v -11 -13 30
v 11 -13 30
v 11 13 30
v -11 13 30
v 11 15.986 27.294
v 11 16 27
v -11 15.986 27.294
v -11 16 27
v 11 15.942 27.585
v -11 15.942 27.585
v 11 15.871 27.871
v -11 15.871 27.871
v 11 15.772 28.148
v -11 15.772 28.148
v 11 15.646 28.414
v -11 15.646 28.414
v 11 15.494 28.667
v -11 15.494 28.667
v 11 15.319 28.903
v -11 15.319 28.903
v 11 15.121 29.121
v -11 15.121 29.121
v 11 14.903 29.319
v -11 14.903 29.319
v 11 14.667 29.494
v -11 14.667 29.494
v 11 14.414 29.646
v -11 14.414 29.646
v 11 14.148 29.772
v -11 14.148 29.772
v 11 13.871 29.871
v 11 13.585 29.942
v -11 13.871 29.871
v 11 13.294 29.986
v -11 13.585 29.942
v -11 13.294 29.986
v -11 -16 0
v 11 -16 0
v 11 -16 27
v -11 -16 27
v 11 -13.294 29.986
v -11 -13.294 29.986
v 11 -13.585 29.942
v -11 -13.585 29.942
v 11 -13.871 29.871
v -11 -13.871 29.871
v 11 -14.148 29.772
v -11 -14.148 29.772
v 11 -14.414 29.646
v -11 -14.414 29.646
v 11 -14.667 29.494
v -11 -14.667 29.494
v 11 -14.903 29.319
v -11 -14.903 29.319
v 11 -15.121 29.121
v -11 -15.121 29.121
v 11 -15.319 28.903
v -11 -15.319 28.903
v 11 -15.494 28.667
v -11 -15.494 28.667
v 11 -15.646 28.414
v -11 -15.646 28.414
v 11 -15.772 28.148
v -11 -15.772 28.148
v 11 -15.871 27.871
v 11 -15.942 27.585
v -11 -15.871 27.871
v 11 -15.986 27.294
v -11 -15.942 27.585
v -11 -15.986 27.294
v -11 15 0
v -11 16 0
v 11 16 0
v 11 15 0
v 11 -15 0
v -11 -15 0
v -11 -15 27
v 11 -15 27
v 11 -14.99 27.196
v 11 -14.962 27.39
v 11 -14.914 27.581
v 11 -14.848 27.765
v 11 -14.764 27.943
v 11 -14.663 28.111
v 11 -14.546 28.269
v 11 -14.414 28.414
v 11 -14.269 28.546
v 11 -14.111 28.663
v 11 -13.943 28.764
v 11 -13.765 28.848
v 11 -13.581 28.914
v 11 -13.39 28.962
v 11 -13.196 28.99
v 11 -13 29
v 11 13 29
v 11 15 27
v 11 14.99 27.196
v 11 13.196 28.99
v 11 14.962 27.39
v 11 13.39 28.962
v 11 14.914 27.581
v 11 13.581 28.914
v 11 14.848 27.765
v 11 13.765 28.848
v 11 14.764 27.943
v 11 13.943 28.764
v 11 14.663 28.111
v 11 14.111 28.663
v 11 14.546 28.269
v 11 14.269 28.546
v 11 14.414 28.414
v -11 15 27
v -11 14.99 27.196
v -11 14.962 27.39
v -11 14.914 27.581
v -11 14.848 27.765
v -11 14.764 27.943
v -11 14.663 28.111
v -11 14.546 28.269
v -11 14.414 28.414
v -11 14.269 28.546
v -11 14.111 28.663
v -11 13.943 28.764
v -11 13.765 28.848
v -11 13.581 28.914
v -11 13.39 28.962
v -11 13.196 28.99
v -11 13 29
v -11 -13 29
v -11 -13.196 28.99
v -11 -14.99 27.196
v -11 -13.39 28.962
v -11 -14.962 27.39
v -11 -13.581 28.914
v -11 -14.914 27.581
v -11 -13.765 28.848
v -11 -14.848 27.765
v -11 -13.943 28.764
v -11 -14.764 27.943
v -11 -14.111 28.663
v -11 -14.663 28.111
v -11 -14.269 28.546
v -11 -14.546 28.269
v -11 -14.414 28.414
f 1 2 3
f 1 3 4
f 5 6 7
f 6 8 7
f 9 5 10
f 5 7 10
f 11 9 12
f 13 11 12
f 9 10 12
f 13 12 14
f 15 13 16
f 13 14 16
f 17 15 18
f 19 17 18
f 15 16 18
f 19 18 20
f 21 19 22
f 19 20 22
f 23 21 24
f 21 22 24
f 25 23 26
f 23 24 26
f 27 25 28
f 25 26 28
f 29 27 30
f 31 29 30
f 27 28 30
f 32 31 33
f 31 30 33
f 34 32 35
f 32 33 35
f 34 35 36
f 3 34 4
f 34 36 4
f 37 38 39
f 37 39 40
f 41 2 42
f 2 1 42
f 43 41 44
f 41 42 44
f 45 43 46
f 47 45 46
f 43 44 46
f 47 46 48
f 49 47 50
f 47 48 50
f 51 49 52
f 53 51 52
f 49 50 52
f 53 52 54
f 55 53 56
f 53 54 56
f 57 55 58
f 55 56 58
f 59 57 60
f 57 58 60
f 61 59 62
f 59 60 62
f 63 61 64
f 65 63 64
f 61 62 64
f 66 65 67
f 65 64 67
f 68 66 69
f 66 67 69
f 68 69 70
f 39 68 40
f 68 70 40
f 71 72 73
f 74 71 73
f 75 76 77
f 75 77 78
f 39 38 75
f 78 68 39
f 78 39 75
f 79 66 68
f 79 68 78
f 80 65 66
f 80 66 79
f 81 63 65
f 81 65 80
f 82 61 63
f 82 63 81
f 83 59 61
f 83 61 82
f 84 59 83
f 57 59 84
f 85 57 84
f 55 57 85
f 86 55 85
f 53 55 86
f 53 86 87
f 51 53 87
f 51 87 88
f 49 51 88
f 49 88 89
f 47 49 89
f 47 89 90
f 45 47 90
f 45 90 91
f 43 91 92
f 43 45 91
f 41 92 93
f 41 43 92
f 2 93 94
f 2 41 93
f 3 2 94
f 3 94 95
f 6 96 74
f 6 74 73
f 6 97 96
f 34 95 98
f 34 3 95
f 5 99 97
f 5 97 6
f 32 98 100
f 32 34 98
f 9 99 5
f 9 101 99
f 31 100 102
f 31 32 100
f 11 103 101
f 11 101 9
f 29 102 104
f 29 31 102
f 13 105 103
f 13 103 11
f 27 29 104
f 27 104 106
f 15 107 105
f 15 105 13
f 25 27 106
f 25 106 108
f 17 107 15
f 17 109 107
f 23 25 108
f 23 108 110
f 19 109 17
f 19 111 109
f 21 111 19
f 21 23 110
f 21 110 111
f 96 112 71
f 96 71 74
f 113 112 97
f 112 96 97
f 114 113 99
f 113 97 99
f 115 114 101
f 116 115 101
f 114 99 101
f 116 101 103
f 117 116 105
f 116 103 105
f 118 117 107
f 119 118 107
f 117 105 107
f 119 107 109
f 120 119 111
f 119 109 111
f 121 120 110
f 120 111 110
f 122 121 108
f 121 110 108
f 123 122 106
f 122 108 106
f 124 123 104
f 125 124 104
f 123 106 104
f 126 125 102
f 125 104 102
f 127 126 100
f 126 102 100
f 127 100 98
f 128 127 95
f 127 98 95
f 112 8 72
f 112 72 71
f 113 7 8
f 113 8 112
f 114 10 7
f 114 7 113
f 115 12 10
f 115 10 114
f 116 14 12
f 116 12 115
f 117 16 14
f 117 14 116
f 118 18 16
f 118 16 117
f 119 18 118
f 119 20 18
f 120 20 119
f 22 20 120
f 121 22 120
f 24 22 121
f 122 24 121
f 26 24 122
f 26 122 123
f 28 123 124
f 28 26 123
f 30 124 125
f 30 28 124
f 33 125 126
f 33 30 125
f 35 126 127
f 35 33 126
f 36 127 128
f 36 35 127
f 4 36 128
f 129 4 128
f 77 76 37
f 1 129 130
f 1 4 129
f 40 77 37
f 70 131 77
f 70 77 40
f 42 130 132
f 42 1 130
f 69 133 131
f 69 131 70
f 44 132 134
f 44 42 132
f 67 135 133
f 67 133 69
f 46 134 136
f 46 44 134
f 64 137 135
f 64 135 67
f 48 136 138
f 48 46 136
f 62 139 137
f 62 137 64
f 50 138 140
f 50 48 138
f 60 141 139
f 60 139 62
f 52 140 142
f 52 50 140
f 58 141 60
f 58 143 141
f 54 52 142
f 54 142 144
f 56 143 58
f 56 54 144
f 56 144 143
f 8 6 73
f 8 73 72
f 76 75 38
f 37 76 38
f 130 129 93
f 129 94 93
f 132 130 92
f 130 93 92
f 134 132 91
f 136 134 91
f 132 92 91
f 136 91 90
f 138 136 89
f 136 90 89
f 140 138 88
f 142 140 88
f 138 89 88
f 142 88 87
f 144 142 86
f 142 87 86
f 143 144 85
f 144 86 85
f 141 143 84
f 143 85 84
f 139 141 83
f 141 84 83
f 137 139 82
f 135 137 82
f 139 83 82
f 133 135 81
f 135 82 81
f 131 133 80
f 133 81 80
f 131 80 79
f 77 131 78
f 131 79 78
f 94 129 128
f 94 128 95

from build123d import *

# Parameters (mm, degrees)
SKETCH1_W = 22
SKETCH1_H = 1


with BuildPart() as part:
    # Sweep1: sweep along a path in Sketch2
    with BuildLine(Plane(origin=(0, 0, 0), x_dir=(0, 0, -1), z_dir=(1, 0, 0))) as sweep1_path:
        Line((0, 15.5), (-27, 15.5))
        ThreePointArc((-27, 15.5), (-28.767766953, 14.767766953), (-29.5, 13))
        Line((-29.5, 13), (-29.5, -13))
        ThreePointArc((-29.5, -13), (-28.767766953, -14.767766953), (-27, -15.5))
        Line((-27, -15.5), (0, -15.5))
    # Sketch1 → Sweep1 (sweep)
    with BuildSketch(Plane.XY):
        with Locations((0, 15.5)):
            Rectangle(SKETCH1_W, SKETCH1_H)
    sweep(path=sweep1_path.line)


solid = part.part
